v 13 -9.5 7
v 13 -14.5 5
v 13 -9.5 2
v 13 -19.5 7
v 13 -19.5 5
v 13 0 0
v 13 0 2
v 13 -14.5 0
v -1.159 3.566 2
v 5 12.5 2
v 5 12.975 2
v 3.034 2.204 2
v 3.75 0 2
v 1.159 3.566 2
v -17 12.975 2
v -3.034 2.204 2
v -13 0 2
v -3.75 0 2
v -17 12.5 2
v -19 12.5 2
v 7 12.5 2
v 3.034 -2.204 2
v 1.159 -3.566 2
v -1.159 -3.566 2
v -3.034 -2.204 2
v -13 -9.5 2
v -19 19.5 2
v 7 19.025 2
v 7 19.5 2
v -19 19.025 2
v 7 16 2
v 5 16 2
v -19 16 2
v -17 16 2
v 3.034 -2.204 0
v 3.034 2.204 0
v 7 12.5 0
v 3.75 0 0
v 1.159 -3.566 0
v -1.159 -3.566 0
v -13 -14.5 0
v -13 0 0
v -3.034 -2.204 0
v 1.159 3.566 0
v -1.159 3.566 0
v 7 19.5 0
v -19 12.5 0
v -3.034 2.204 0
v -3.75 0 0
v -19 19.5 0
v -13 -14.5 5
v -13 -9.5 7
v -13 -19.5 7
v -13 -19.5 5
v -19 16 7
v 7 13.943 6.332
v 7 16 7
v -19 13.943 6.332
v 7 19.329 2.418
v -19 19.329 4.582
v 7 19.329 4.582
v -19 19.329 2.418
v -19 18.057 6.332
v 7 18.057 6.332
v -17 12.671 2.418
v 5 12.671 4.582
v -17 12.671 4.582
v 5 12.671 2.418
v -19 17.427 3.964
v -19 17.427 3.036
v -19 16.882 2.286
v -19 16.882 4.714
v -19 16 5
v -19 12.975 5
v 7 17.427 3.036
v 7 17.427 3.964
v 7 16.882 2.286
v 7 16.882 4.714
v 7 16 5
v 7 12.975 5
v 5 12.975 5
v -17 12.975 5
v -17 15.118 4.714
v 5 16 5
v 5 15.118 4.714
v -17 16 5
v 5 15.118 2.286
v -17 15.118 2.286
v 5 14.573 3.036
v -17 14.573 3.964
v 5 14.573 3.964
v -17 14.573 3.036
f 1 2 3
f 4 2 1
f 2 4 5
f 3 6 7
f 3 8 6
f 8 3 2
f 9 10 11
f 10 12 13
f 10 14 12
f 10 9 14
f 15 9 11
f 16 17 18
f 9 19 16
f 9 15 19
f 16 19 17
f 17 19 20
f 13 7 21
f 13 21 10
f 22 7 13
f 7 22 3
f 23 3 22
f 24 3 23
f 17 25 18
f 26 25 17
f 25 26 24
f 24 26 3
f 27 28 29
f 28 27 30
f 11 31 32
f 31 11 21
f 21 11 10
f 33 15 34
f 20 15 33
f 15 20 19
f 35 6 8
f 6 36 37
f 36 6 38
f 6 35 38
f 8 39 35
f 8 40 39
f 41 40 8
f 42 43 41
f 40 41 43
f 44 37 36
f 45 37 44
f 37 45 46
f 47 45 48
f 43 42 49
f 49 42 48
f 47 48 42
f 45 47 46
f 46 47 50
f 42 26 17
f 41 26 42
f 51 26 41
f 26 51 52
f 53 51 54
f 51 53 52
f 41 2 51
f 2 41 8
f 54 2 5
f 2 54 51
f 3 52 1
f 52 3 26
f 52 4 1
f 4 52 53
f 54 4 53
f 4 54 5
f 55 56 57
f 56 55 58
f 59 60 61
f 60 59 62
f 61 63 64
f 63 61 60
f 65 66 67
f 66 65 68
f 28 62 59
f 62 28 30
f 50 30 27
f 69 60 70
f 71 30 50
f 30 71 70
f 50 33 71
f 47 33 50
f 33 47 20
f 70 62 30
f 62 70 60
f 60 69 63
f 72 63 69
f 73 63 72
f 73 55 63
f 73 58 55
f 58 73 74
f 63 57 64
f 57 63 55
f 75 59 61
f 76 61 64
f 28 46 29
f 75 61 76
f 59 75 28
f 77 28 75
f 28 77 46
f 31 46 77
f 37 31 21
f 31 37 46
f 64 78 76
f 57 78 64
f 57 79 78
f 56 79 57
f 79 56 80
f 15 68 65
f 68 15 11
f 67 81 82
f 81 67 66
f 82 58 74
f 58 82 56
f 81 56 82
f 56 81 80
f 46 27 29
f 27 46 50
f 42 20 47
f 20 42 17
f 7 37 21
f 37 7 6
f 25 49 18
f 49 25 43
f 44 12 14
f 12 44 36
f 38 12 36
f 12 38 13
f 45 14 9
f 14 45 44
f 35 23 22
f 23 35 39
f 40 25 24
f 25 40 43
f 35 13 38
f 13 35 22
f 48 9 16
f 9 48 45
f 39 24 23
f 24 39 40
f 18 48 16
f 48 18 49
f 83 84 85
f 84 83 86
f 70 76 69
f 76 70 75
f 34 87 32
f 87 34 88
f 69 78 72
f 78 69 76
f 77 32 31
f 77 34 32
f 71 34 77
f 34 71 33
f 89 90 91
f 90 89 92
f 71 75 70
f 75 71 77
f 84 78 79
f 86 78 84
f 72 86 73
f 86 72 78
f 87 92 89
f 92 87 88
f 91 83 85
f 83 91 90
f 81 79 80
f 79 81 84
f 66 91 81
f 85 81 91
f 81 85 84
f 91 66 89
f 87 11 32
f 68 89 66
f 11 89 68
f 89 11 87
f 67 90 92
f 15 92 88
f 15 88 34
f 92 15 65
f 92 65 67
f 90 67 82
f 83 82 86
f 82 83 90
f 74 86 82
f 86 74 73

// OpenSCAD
//origin = hole
$fn=10;

squooje_factor = 0.5;

hole_diameter = 7 + squooje_factor; //mm
part_height = 2;

lip_to_hole = 15 - squooje_factor;
hole_to_end = 20;
frame_width = 26;

overlap = 5;
inner_frame_length = 5;

hole_to_reed = 16;
reed_diameter = 2.5 + squooje_factor;
reed_length = 18;
bend_space = 2;
reed_full_length = reed_length+bend_space*2;
wall_width = 2;

reed_offset = 6; //towards wheel, reedcentre <-> hole centre

lip_height = 5;

difference(){
	union() {
		translate([-frame_width/2, -lip_to_hole]) cube([frame_width, lip_to_hole, part_height]); //lowest flat part

		translate([-frame_width/2, -lip_to_hole , part_height]) #cube([frame_width, overlap,  lip_height - part_height]);//middle sandwich

		translate([-frame_width/2, -lip_to_hole - overlap, lip_height]) cube([frame_width, overlap + inner_frame_length,  part_height]);//upper flat part

		translate([-frame_width/2 - reed_offset, hole_to_reed, part_height + reed_diameter/2]) rotate([0,90,0]) cylinder(d=reed_diameter+2*wall_width, h=frame_width);//reed protector cylinder

		linear_extrude(height=part_height) polygon(points=[
			[frame_width/2,0],
			[frame_width/2 - reed_offset,  hole_to_reed - reed_diameter/2 - wall_width],
			[frame_width/2 - reed_offset,  hole_to_reed + reed_diameter/2 + wall_width],
			[-frame_width/2 - reed_offset,  hole_to_reed + reed_diameter/2 + wall_width],
			[-frame_width/2 - reed_offset,  hole_to_reed - reed_diameter/2 - wall_width],
			[-frame_width/2,0]]);  // hole to reed cylinder
	}

	cylinder(d=hole_diameter, h=part_height); //screw hole

	translate([-frame_width/2 - reed_offset, hole_to_reed, part_height + reed_diameter/2]) rotate([0,90,0]) cylinder(d=reed_diameter, h=frame_width); //reed hole

	translate([frame_width/2 - reed_offset - (frame_width - reed_full_length)/2, hole_to_reed - reed_diameter/2 - wall_width, part_height]) cube([(frame_width - reed_full_length), reed_diameter/2+wall_width, reed_diameter]); //reed legs gap RHS

	translate([-frame_width/2 - reed_offset - (frame_width - reed_full_length)/2, hole_to_reed - reed_diameter/2 - wall_width, part_height]) #cube([(frame_width - reed_full_length), reed_diameter/2+wall_width, reed_diameter]); //reed legs gap LHS
}
